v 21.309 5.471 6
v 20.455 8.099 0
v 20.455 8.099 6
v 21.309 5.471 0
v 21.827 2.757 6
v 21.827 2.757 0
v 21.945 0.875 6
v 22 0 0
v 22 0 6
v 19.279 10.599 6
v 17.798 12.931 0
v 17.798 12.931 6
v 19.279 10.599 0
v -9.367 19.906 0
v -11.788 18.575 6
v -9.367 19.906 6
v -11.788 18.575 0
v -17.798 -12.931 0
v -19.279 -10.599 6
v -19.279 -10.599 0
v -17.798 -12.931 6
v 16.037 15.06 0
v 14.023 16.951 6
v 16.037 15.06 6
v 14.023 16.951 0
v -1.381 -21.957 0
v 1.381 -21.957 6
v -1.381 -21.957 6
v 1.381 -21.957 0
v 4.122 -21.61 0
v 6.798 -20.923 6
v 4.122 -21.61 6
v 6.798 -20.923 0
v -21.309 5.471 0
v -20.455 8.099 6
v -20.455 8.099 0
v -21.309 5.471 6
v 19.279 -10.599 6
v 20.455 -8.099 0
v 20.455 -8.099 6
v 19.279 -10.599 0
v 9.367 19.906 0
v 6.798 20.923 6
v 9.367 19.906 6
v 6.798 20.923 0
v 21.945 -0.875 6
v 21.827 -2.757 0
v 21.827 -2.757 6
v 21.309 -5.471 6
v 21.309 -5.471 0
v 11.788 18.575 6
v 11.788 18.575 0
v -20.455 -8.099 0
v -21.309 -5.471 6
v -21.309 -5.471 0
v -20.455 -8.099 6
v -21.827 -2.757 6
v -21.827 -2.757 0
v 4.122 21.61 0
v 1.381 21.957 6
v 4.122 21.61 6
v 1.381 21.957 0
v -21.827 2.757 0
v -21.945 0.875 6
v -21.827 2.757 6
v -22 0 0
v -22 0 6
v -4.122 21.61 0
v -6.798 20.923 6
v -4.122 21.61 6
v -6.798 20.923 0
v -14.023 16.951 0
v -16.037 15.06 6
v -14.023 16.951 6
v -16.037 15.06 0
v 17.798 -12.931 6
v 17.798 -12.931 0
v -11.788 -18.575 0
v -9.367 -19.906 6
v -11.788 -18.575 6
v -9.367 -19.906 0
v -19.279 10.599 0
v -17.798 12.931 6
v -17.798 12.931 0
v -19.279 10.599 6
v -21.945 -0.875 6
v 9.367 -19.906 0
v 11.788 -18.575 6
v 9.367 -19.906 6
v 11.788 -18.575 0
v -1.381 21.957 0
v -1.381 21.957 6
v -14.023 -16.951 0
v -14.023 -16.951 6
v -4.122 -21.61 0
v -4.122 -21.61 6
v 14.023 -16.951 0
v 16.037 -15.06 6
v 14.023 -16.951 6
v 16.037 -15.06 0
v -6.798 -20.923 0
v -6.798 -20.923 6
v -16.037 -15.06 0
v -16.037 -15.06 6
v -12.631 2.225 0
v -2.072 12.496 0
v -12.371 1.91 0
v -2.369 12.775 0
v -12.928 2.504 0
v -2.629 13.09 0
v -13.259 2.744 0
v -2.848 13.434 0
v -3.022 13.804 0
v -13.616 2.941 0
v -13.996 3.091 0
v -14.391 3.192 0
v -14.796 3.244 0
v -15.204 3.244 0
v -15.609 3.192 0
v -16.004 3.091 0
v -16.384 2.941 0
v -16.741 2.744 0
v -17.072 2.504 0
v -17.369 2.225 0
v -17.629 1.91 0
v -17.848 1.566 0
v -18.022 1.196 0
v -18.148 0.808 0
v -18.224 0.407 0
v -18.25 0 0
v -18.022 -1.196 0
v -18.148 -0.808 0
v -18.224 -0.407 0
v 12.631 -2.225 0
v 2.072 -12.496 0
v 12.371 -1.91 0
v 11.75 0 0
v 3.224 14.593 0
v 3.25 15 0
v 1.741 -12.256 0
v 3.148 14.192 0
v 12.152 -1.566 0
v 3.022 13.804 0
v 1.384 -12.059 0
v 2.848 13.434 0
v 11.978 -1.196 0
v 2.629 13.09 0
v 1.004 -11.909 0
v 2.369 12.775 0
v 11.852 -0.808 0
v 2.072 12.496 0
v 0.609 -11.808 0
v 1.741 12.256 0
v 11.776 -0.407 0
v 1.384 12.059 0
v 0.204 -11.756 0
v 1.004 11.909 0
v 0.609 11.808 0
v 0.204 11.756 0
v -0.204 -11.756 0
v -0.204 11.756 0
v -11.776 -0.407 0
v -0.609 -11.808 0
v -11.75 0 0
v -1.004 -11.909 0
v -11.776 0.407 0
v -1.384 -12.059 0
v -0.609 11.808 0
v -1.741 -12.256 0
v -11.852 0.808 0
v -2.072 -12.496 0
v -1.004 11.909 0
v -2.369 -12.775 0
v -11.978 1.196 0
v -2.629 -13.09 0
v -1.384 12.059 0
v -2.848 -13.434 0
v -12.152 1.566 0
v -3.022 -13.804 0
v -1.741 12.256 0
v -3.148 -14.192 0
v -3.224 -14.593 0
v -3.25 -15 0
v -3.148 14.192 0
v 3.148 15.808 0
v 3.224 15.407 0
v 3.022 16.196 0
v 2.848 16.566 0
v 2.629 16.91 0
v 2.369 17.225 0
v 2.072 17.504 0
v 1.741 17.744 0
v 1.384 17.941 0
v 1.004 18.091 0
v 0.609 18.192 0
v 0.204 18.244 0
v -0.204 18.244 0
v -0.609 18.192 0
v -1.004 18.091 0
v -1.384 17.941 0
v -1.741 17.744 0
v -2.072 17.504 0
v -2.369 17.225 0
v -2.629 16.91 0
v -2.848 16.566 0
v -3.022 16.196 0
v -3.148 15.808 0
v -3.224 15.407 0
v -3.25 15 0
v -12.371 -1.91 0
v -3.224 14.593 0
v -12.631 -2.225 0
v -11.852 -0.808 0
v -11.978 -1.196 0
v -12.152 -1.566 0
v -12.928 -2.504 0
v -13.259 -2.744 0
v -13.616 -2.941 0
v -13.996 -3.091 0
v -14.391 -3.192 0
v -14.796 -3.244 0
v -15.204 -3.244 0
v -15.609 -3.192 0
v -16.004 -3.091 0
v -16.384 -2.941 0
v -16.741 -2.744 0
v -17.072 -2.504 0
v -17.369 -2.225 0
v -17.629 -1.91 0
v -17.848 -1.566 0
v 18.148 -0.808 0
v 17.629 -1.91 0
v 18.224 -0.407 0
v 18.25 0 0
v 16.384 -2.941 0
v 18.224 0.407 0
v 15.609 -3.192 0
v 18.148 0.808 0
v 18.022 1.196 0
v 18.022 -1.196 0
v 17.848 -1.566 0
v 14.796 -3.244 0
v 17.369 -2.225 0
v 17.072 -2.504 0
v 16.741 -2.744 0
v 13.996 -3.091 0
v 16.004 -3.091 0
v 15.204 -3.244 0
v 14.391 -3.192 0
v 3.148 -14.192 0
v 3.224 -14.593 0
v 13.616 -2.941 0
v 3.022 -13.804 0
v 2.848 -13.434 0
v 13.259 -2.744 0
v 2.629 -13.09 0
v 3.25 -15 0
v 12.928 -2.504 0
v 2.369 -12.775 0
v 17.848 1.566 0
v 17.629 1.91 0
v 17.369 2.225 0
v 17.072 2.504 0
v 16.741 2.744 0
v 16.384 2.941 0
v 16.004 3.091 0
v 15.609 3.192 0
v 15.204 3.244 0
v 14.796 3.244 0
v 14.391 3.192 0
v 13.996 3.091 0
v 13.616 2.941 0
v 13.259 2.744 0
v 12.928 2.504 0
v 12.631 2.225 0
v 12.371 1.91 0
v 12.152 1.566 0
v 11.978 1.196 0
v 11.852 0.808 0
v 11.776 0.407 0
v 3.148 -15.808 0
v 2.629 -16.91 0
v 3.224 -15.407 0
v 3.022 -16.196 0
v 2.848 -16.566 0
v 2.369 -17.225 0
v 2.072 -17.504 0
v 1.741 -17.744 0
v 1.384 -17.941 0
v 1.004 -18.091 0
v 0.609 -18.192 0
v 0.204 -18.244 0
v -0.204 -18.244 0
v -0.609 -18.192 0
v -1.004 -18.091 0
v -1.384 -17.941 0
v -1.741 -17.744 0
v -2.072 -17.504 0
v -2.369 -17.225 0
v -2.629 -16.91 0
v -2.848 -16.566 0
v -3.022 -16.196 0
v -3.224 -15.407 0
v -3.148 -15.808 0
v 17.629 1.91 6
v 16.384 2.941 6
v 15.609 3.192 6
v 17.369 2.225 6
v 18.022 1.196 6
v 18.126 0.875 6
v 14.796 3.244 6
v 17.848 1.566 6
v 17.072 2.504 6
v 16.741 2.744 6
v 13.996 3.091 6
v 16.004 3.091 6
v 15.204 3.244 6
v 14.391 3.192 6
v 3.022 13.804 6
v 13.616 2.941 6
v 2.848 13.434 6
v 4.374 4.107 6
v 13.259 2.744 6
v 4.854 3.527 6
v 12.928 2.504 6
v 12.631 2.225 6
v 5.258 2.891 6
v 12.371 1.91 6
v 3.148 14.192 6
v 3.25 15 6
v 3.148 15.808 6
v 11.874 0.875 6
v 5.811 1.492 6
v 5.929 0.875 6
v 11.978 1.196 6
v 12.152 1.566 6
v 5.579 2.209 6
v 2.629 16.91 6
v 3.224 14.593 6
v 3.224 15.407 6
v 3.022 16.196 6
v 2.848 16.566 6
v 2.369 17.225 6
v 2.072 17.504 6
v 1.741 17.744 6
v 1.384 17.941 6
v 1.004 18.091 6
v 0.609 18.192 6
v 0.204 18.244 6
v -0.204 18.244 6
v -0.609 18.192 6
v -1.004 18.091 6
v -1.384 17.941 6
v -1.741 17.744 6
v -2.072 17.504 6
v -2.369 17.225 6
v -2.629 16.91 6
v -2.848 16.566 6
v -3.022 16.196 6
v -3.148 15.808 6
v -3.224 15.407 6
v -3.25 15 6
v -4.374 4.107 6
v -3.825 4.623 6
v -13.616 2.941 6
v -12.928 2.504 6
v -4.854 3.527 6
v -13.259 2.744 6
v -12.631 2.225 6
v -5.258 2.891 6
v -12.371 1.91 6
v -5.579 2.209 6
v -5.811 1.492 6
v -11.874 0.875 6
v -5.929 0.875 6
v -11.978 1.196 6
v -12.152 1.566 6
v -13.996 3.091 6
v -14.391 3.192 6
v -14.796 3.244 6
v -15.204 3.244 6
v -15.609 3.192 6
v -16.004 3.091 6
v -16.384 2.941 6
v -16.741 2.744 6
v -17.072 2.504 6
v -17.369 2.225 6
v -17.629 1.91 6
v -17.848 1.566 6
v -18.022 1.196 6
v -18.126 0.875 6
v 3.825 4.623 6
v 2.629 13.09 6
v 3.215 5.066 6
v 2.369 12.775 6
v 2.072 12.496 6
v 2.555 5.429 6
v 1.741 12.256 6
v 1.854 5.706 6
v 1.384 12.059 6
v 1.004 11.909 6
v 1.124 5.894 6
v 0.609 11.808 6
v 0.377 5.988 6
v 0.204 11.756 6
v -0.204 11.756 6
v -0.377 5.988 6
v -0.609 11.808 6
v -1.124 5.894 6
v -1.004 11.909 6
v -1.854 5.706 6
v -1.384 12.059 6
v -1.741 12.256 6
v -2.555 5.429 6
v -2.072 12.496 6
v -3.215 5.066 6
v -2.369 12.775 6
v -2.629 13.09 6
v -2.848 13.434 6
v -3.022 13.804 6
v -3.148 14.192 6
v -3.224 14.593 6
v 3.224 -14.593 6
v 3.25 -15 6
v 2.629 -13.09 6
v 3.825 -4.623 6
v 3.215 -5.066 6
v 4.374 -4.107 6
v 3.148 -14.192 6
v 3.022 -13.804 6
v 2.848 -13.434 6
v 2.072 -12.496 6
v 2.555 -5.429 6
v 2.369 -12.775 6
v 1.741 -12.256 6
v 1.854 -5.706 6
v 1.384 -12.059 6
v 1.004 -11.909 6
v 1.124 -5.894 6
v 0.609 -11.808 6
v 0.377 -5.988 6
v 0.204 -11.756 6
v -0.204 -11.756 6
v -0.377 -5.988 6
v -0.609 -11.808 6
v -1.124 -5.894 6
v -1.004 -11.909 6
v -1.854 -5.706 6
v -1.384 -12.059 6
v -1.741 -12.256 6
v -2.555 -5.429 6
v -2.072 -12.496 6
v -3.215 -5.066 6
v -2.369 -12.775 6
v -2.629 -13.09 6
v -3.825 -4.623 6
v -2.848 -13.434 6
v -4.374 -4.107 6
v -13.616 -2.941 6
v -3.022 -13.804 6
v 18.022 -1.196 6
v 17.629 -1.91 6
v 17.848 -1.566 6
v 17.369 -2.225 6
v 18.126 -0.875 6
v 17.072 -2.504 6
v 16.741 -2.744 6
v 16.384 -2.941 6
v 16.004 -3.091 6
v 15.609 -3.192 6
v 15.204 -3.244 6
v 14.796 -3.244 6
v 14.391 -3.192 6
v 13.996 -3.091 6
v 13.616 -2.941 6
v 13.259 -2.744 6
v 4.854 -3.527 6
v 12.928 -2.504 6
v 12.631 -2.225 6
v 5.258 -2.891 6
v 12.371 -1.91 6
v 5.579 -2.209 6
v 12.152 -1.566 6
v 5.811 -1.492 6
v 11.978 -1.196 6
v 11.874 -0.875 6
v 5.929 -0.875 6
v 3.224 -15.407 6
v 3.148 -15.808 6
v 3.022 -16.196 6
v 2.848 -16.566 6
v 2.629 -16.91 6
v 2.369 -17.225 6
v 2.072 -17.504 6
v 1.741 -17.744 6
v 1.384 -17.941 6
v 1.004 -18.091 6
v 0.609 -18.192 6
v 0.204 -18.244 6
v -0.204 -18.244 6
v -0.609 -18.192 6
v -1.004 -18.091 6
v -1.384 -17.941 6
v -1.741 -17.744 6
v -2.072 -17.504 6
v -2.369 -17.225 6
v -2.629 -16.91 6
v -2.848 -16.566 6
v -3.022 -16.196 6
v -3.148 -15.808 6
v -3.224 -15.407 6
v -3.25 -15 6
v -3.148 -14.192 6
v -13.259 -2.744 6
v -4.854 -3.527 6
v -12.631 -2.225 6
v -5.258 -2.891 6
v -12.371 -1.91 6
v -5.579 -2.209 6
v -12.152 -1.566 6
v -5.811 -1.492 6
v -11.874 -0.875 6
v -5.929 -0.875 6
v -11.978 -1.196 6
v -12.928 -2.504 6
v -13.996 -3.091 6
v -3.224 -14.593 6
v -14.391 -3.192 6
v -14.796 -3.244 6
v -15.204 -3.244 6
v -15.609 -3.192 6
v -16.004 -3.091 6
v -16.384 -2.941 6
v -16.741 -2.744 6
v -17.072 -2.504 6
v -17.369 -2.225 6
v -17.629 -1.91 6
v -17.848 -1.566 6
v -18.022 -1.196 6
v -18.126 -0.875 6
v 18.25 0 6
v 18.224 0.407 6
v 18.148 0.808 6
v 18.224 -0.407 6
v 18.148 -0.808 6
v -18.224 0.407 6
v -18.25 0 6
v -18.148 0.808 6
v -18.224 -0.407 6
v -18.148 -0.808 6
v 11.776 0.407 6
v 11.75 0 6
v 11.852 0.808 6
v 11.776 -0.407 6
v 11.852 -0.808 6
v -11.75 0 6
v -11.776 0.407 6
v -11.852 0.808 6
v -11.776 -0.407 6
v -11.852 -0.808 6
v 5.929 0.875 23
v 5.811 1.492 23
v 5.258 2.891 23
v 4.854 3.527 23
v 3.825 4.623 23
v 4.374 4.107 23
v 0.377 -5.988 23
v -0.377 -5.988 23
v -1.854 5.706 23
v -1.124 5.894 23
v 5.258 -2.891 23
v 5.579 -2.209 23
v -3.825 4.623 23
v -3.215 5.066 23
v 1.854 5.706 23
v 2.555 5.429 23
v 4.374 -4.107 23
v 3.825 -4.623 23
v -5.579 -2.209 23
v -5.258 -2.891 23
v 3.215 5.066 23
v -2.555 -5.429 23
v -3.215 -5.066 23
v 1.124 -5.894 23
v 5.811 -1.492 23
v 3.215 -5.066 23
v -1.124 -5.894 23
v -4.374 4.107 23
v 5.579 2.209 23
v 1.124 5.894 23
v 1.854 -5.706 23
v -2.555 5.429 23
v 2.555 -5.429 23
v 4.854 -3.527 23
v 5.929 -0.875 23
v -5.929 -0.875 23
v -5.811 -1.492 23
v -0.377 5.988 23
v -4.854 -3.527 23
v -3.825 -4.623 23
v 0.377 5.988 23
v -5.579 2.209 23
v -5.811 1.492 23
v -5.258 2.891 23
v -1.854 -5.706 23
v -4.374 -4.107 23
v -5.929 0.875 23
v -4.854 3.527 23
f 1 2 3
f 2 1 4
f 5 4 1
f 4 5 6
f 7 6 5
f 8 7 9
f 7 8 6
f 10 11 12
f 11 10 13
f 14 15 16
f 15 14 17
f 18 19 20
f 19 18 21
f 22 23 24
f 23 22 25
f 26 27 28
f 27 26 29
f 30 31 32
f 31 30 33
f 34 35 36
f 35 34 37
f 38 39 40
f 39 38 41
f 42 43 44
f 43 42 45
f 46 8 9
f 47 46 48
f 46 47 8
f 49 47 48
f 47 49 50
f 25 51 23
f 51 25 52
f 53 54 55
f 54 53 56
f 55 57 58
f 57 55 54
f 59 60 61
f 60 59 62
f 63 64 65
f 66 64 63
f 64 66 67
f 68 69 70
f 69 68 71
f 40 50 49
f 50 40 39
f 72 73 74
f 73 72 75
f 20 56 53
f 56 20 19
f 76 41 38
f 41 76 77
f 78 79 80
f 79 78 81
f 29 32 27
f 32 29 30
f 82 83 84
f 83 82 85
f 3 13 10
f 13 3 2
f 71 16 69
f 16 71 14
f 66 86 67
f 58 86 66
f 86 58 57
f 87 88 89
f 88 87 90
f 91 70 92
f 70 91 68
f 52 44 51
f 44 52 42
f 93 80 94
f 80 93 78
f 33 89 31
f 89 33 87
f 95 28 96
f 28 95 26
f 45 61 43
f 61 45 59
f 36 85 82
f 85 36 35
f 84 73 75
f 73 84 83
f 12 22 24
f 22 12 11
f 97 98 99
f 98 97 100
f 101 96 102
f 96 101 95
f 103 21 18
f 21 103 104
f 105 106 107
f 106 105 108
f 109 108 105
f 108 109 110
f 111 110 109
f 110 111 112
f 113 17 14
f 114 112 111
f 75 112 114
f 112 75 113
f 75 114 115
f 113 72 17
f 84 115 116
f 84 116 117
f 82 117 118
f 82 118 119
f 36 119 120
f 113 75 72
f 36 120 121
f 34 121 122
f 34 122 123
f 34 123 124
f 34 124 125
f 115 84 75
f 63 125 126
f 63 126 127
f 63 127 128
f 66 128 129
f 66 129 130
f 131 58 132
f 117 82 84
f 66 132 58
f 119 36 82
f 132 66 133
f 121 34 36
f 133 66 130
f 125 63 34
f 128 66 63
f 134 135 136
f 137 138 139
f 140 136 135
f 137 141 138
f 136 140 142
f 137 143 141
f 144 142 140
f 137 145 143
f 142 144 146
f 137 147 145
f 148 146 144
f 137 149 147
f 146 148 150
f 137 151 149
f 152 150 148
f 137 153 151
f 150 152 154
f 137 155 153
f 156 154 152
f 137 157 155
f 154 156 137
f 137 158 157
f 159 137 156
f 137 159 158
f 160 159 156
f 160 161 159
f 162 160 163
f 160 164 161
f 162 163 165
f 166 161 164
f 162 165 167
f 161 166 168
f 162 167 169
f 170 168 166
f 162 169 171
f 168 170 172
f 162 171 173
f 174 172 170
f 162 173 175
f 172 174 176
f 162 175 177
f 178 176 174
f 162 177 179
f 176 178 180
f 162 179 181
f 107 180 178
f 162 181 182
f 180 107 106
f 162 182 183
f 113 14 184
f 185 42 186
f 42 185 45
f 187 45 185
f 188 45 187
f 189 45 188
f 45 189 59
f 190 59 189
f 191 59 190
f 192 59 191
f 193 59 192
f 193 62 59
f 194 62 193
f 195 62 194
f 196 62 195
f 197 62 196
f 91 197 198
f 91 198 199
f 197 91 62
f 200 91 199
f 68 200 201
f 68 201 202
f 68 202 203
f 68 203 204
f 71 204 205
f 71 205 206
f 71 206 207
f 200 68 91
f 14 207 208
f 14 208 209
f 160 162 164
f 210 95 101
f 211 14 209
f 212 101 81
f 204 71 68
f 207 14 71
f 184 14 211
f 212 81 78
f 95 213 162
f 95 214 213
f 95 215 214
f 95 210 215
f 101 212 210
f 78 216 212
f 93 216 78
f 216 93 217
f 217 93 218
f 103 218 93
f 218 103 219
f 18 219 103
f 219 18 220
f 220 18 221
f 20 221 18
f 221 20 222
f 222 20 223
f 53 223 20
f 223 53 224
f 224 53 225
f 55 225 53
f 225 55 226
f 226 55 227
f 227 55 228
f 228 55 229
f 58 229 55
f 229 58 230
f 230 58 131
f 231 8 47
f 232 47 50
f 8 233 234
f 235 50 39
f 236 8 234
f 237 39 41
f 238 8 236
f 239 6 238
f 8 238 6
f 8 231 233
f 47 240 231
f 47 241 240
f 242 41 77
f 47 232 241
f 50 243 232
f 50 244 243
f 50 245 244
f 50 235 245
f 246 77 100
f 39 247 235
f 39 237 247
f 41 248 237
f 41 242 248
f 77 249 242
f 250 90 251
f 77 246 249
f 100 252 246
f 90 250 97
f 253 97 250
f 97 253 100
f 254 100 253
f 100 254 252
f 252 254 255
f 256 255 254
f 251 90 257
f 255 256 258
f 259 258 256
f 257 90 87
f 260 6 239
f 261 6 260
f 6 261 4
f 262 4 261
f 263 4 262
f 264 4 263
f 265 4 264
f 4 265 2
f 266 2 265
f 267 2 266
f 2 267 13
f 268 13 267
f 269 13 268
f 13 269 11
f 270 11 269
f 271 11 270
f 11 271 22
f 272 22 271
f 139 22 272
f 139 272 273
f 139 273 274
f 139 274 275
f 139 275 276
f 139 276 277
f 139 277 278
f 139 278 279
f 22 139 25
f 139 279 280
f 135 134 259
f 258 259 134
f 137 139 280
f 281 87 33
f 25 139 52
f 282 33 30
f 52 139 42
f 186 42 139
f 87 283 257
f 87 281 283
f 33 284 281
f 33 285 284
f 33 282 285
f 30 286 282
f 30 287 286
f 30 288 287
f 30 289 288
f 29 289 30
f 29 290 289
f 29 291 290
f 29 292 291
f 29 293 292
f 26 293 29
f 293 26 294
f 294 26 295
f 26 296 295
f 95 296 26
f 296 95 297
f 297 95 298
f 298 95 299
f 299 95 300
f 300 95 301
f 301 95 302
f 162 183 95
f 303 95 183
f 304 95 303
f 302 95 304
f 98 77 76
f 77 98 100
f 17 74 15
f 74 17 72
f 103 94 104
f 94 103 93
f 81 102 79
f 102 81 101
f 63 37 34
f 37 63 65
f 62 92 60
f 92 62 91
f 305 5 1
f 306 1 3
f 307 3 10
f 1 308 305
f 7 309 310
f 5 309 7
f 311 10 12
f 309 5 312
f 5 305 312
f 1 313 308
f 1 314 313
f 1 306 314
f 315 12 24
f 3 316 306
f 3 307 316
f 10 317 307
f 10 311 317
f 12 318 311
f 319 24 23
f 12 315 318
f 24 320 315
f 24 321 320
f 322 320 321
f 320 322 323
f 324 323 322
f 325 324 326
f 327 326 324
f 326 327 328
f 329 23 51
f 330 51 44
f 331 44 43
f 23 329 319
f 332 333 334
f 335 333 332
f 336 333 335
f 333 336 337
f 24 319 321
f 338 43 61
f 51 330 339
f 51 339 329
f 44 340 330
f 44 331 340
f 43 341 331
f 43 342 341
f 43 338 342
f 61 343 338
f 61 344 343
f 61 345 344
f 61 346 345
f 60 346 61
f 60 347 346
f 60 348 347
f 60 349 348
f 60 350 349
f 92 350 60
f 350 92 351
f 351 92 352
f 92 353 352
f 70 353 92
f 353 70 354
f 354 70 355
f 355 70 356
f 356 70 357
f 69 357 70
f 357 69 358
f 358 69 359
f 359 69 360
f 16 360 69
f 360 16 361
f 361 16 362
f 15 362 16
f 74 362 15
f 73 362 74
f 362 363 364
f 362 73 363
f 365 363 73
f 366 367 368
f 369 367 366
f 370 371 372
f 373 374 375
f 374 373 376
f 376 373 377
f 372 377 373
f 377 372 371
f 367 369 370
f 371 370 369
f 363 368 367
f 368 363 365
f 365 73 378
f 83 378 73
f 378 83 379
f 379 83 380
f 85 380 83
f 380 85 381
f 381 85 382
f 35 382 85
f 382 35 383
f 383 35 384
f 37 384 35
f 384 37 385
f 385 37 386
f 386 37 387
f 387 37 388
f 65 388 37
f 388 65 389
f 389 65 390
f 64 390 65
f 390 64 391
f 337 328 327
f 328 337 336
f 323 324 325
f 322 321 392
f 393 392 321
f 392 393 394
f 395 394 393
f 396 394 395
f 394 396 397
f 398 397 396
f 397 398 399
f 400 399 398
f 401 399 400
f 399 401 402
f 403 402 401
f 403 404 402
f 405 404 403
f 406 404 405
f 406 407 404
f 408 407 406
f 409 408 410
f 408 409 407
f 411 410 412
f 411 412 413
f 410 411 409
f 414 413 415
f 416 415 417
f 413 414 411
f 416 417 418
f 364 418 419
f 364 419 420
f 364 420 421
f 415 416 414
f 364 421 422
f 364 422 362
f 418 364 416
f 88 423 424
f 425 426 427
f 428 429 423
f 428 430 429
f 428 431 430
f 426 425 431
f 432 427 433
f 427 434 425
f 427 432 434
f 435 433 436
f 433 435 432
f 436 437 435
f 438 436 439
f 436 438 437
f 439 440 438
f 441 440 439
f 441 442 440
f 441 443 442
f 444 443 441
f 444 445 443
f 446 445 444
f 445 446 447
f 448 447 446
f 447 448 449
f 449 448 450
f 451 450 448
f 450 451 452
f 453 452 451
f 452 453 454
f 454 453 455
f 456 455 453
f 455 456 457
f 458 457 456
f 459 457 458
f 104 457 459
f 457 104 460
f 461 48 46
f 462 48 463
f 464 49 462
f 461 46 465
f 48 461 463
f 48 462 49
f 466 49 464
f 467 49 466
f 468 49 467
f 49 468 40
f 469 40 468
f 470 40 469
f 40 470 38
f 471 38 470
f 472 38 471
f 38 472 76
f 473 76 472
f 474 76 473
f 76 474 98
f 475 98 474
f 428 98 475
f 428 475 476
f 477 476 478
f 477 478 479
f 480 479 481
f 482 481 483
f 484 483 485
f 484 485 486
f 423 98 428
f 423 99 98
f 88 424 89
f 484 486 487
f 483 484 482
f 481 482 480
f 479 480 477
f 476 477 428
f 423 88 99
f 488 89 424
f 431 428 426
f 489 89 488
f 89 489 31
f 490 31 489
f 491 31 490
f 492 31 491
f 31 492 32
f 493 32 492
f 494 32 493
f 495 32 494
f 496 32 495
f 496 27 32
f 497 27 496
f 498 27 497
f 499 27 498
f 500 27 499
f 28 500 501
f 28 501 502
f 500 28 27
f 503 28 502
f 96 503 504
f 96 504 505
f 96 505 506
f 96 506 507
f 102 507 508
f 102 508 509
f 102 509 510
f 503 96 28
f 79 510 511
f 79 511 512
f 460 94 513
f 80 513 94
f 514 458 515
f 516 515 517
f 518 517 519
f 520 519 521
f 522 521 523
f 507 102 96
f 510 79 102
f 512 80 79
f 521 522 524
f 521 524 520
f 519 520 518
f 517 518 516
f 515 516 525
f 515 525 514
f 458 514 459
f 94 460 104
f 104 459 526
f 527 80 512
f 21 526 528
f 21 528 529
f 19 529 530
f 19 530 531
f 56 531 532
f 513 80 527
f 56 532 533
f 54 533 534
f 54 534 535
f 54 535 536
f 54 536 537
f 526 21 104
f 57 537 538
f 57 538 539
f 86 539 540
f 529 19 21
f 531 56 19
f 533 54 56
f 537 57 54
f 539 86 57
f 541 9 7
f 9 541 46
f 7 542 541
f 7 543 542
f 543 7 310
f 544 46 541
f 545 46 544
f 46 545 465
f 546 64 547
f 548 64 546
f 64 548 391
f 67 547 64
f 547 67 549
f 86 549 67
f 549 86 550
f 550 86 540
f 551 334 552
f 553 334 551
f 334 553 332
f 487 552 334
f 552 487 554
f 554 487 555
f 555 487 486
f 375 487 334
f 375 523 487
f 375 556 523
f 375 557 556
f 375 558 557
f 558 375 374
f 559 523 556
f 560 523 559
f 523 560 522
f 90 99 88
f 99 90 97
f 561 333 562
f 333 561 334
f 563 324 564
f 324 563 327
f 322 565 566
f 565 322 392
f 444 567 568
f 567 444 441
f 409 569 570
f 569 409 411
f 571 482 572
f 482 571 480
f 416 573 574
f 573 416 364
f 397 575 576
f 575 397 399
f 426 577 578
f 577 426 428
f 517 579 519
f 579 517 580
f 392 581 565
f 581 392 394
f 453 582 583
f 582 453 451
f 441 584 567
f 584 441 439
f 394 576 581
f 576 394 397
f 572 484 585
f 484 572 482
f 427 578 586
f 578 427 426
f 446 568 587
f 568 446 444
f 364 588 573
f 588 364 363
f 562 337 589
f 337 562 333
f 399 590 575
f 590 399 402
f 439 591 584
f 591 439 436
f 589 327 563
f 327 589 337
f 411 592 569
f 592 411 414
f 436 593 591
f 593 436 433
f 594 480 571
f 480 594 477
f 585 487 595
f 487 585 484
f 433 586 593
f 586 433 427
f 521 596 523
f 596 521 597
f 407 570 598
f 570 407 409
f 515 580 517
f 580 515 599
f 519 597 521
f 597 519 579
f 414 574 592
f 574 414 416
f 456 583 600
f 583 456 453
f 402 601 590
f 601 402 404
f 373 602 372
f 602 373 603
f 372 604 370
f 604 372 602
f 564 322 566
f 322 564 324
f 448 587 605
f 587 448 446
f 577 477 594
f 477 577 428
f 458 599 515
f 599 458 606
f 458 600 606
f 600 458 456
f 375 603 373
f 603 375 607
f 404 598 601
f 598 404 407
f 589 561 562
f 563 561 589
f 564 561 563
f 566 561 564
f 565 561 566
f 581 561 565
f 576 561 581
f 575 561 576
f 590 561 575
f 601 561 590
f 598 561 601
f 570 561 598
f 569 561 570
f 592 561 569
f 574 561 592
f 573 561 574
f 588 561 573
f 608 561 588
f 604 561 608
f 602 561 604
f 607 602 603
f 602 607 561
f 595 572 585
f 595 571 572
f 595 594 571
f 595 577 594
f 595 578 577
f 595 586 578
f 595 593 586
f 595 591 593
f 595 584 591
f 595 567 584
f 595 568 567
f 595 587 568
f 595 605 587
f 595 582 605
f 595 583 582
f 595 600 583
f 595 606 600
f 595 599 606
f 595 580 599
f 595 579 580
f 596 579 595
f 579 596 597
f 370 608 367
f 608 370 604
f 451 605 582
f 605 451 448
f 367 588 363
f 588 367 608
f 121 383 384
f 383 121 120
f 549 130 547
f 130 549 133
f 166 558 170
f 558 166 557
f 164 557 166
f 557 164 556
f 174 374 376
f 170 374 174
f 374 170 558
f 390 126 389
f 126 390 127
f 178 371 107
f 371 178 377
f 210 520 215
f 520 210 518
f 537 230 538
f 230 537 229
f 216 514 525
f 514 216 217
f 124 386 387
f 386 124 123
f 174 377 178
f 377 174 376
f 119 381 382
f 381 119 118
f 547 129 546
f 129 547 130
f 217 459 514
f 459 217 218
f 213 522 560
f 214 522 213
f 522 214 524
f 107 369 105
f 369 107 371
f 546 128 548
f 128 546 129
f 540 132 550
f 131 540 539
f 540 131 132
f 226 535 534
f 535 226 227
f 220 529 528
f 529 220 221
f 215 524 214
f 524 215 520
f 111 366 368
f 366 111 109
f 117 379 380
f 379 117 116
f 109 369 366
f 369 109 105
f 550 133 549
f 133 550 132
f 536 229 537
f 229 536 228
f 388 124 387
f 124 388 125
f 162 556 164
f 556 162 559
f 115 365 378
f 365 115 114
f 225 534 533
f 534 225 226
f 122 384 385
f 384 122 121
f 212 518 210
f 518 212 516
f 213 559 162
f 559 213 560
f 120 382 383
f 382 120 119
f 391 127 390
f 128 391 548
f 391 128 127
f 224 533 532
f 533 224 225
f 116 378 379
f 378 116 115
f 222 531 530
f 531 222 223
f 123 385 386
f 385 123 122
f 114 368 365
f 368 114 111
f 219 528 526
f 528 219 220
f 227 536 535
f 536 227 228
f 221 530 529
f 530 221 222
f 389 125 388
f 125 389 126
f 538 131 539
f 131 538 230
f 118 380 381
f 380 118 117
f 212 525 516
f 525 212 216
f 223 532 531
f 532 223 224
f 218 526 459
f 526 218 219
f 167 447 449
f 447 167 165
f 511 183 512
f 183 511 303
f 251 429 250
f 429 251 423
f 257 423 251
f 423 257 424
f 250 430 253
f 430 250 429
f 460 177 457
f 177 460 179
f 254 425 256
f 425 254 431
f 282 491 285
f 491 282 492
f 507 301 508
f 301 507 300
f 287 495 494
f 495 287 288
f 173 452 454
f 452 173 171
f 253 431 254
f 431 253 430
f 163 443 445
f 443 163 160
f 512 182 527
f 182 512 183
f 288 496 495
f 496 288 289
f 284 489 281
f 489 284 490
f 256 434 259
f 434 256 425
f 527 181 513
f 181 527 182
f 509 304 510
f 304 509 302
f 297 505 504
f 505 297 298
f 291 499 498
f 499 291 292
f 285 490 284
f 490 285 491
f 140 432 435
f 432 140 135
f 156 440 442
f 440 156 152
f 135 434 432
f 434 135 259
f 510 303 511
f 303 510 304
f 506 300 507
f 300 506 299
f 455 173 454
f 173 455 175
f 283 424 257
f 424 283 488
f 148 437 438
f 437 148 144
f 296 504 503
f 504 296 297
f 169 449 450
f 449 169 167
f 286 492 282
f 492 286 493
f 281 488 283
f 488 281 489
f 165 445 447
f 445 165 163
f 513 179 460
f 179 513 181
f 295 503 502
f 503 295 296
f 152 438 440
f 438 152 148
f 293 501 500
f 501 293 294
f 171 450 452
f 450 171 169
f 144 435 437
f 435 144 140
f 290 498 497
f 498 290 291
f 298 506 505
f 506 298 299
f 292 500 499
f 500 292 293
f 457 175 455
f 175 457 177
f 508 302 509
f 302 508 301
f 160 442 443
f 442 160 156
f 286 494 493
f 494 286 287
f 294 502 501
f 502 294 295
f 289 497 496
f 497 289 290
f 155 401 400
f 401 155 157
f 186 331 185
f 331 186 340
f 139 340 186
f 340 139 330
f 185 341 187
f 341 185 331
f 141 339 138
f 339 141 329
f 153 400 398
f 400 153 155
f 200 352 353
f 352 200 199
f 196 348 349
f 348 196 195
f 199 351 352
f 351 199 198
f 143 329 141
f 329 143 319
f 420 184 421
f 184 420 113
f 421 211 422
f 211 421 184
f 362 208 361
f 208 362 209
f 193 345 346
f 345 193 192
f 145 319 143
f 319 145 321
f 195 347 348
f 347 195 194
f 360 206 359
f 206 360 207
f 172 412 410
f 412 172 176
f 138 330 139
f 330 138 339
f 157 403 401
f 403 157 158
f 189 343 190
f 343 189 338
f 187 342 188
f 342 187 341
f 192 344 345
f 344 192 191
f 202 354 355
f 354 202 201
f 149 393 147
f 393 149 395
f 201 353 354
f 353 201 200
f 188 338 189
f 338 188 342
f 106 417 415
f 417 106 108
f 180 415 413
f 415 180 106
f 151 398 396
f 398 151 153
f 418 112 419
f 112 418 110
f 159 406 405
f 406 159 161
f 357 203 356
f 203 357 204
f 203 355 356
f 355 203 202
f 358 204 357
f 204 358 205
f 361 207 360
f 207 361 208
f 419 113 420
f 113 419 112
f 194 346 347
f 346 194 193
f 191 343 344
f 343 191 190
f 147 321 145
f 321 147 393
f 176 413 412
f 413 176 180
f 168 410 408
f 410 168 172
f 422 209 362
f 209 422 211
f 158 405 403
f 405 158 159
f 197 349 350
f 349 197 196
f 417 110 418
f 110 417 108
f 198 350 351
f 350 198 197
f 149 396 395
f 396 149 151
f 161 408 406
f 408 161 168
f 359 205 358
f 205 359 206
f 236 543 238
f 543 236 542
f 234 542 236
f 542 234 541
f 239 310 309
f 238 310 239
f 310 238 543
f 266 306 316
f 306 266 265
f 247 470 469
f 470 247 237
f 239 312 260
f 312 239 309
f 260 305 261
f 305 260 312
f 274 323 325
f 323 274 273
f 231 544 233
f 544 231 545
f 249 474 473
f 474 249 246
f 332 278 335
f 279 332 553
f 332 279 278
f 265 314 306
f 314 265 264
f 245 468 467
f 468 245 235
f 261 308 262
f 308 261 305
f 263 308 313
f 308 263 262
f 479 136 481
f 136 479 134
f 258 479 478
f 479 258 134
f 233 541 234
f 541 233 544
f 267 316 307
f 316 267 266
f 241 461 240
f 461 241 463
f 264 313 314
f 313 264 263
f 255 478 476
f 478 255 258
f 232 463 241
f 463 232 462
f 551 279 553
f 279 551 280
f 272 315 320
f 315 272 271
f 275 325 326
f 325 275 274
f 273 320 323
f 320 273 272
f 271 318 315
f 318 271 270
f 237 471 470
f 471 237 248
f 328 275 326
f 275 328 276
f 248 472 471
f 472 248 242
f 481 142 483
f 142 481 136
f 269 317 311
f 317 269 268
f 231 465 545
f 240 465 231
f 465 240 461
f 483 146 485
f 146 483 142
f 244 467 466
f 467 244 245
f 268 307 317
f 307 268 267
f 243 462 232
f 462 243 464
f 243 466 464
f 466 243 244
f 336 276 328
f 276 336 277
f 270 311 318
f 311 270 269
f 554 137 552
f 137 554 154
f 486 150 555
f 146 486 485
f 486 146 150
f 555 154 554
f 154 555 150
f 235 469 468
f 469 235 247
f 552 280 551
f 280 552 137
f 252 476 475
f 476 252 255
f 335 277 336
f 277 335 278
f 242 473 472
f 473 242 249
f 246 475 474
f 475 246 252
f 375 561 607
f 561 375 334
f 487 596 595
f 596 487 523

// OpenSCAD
$fn = 50;


difference() {
	union() {
		cylinder(h = 6, r = 22.0000000000);
		translate(v = [0, 0, 3.0000000000]) {
			cylinder(h = 20, r = 6.0000000000);
		}
	}
	union() {
		translate(v = [-15.0000000000, 0.0000000000, -50.0000000000]) {
			cylinder(h = 100, r = 3.2500000000);
		}
		translate(v = [0.0000000000, -15.0000000000, -50.0000000000]) {
			cylinder(h = 100, r = 3.2500000000);
		}
		translate(v = [0.0000000000, 15.0000000000, -50.0000000000]) {
			cylinder(h = 100, r = 3.2500000000);
		}
		translate(v = [15.0000000000, 0.0000000000, -50.0000000000]) {
			cylinder(h = 100, r = 3.2500000000);
		}
		translate(v = [-27.0000000000, -0.8750000000, 6]) {
			cube(size = [54, 1.7500000000, 20]);
		}
	}
}
